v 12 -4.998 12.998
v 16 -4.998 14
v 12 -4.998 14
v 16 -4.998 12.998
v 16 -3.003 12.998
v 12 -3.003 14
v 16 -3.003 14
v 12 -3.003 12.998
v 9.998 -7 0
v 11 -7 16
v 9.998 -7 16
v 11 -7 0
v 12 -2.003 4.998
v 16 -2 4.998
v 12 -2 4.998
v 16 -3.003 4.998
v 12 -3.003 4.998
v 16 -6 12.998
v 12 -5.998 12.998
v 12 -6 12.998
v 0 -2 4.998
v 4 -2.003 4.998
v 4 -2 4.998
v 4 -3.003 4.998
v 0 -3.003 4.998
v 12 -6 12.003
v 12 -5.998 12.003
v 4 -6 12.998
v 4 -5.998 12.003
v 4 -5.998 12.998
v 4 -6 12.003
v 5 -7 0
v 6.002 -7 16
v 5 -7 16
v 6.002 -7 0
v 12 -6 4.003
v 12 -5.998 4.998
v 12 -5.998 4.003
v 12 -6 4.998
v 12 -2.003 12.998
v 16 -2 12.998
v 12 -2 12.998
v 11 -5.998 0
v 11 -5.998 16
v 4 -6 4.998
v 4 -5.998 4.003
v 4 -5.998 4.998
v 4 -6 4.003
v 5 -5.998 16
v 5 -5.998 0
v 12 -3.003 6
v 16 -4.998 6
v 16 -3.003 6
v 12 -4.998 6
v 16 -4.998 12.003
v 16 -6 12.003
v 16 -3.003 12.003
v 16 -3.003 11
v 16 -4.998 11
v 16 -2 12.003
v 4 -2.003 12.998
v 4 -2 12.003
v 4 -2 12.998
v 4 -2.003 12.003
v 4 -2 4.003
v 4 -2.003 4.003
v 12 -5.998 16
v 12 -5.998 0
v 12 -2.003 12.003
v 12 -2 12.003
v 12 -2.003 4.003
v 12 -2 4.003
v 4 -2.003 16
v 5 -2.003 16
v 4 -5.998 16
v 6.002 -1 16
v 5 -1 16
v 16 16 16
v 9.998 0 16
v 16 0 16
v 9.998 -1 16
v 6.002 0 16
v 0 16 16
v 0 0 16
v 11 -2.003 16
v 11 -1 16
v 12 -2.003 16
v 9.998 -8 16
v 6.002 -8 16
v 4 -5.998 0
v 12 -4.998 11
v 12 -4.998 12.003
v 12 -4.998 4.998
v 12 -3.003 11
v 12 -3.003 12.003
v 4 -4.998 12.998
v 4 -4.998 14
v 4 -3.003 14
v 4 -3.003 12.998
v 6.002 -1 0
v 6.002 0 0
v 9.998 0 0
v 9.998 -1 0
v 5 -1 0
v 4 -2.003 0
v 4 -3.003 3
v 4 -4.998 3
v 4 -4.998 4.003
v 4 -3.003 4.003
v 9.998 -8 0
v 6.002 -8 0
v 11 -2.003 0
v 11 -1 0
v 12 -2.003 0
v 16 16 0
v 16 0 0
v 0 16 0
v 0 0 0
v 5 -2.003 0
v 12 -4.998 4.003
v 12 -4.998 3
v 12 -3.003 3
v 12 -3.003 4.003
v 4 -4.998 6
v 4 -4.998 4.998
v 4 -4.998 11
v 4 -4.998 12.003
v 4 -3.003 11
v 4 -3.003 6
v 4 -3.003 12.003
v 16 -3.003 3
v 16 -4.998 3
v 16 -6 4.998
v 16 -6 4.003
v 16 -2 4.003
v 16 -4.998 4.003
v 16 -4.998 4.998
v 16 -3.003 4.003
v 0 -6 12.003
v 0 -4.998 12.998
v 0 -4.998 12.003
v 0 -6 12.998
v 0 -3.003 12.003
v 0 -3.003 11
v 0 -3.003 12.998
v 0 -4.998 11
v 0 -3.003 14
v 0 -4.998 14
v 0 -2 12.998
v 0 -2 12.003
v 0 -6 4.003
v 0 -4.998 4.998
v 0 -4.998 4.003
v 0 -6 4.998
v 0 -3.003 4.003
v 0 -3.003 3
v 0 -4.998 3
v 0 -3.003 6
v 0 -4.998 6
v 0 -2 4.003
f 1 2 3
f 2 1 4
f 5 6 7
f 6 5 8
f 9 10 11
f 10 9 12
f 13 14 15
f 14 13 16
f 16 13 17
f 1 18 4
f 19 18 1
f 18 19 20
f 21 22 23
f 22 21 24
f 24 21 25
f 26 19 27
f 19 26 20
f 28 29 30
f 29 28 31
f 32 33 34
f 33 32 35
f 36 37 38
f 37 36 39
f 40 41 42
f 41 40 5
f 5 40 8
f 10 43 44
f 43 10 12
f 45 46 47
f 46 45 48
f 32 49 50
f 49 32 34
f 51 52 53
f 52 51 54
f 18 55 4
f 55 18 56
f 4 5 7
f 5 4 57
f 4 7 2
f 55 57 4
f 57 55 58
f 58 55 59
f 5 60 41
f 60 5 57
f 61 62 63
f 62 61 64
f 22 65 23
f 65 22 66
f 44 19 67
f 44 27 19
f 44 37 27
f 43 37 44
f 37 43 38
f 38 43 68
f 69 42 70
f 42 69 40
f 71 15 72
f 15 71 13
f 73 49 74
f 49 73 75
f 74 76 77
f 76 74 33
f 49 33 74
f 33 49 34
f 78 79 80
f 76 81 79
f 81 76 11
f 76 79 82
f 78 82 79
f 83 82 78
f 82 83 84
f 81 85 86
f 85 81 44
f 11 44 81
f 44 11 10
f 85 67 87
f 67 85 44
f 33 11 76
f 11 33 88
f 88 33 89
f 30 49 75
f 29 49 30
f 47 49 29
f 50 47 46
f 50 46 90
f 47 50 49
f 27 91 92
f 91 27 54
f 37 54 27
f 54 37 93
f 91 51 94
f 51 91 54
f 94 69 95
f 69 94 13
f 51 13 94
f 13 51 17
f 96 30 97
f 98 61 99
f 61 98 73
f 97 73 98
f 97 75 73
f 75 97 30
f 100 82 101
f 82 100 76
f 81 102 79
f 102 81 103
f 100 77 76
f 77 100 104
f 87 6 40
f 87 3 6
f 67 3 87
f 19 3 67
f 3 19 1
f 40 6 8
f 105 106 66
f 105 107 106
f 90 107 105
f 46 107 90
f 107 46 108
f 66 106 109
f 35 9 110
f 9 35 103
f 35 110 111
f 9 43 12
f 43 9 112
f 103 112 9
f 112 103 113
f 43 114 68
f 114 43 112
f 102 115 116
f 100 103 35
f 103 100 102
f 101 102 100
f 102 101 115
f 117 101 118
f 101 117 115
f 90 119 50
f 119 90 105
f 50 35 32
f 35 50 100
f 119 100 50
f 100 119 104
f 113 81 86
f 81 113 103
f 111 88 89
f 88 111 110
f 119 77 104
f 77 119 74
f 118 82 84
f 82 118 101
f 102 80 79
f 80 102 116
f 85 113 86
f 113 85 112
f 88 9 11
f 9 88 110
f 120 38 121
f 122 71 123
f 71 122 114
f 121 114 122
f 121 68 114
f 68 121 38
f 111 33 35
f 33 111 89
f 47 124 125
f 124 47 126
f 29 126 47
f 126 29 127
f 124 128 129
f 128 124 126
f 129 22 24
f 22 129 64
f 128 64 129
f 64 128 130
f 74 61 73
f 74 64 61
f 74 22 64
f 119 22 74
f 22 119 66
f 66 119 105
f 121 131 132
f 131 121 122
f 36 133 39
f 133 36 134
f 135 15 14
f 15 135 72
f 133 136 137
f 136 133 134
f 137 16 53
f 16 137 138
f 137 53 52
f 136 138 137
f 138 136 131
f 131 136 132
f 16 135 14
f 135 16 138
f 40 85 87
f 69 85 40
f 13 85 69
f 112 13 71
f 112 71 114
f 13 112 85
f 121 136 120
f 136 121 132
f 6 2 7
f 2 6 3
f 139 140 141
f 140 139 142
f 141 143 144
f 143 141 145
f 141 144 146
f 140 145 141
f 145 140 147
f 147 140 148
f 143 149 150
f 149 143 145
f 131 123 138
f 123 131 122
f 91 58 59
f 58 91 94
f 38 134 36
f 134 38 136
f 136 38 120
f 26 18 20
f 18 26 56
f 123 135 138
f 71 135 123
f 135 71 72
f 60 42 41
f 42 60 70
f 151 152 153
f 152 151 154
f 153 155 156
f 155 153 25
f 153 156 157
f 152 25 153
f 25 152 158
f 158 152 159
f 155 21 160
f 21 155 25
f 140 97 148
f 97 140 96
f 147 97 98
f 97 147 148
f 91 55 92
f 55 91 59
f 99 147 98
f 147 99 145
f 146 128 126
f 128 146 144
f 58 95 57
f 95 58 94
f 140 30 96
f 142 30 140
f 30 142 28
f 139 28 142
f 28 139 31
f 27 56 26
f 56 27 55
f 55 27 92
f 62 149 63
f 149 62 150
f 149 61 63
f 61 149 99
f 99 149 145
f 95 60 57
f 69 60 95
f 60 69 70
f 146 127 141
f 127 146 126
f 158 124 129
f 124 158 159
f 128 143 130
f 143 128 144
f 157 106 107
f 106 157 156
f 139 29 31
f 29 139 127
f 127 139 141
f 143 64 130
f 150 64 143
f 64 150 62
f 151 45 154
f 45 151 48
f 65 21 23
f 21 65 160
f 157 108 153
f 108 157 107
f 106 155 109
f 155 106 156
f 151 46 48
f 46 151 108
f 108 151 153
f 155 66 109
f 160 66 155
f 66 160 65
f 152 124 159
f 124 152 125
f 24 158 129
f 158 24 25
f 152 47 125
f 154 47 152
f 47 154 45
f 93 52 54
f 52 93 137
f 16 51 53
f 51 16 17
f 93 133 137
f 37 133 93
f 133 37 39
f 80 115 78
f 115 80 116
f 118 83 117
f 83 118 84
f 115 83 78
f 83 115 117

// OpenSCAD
module fence() {
  points=[[22,55.99700164794922,11],[22,55.99700164794922,12.003000259399414],[22,54.00199890136719,12.003000259399414],[22,55.99700164794922,11],[22,54.00199890136719,12.003000259399414],[22,54.00199890136719,11],[18,54.00199890136719,14],[18,54.00199890136719,12.998000144958496],[22,54.00199890136719,12.998000144958496],[18,54.00199890136719,14],[22,54.00199890136719,12.998000144958496],[22,54.00199890136719,14],[22,55.99700164794922,14],[22,55.99700164794922,12.998000144958496],[18,55.99700164794922,12.998000144958496],[22,55.99700164794922,14],[18,55.99700164794922,12.998000144958496],[18,55.99700164794922,14],[17,52,-2.6867397195928788e-14],[17,52,16],[15.998000144958496,52,16],[17,52,-2.6867397195928788e-14],[15.998000144958496,52,16],[15.998000144958496,52,-2.6867397195928788e-14],[22,57,4.998000144958496],[18,56.99700164794922,4.998000144958496],[22,55.99700164794922,4.998000144958496],[18,57,4.998000144958496],[18,56.99700164794922,4.998000144958496],[22,57,4.998000144958496],[18,55.99700164794922,4.998000144958496],[22,55.99700164794922,4.998000144958496],[18,56.99700164794922,4.998000144958496],[18,54.00199890136719,12.998000144958496],[18,53.00199890136719,12.998000144958496],[22,54.00199890136719,12.998000144958496],[22,53,12.998000144958496],[22,54.00199890136719,12.998000144958496],[18,53.00199890136719,12.998000144958496],[22,53,12.998000144958496],[18,53.00199890136719,12.998000144958496],[18,53,12.998000144958496],[6,55.99700164794922,4.998000144958496],[10,55.99700164794922,4.998000144958496],[10,56.99700164794922,4.998000144958496],[10,57,4.998000144958496],[6,57,4.998000144958496],[10,56.99700164794922,4.998000144958496],[6,55.99700164794922,4.998000144958496],[10,56.99700164794922,4.998000144958496],[6,57,4.998000144958496],[18,53.00199890136719,12.003000259399414],[18,53,12.003000259399414],[18,53,12.998000144958496],[18,53.00199890136719,12.003000259399414],[18,53,12.998000144958496],[18,53.00199890136719,12.998000144958496],[18,55.99700164794922,6],[18,55.99700164794922,4.998000144958496],[18,56.99700164794922,4.998000144958496],[10,53,12.998000144958496],[10,53,12.003000259399414],[10,53.00199890136719,12.003000259399414],[10,53,12.998000144958496],[10,53.00199890136719,12.003000259399414],[10,53.00199890136719,12.998000144958496],[12.001999855041504,52,-2.6867397195928788e-14],[12.001999855041504,52,16],[11,52,16],[12.001999855041504,52,-2.6867397195928788e-14],[11,52,16],[11,52,-2.6867397195928788e-14],[18,53.00199890136719,4.002999782562256],[18,53,4.002999782562256],[18,53,4.998000144958496],[18,53.00199890136719,4.002999782562256],[18,53,4.998000144958496],[18,53.00199890136719,4.998000144958496],[22,57,12.998000144958496],[18,56.99700164794922,12.998000144958496],[22,55.99700164794922,12.998000144958496],[18,57,12.998000144958496],[18,56.99700164794922,12.998000144958496],[22,57,12.998000144958496],[18,55.99700164794922,12.998000144958496],[22,55.99700164794922,12.998000144958496],[18,56.99700164794922,12.998000144958496],[17,52,16],[17,52,-2.6867397195928788e-14],[17,53.00199890136719,-2.6867397195928788e-14],[17,52,16],[17,53.00199890136719,-2.6867397195928788e-14],[17,53.00199890136719,16],[10,53,4.998000144958496],[10,53,4.002999782562256],[10,53.00199890136719,4.002999782562256],[10,53,4.998000144958496],[10,53.00199890136719,4.002999782562256],[10,53.00199890136719,4.998000144958496],[22,54.00199890136719,14],[22,54.00199890136719,12.998000144958496],[22,55.99700164794922,12.998000144958496],[22,54.00199890136719,14],[22,55.99700164794922,12.998000144958496],[22,55.99700164794922,14],[11,52,16],[11,53.00199890136719,16],[11,53.00199890136719,-2.6867397195928788e-14],[11,52,16],[11,53.00199890136719,-2.6867397195928788e-14],[11,52,-2.6867397195928788e-14],[22,55.99700164794922,6],[18,55.99700164794922,6],[18,54.00199890136719,6],[22,55.99700164794922,6],[18,54.00199890136719,6],[22,54.00199890136719,6],[22,53,12.003000259399414],[22,54.00199890136719,12.003000259399414],[22,54.00199890136719,12.998000144958496],[22,53,12.998000144958496],[22,53,12.003000259399414],[22,54.00199890136719,12.998000144958496],[22,55.99700164794922,12.998000144958496],[22,54.00199890136719,12.998000144958496],[22,54.00199890136719,12.003000259399414],[22,54.00199890136719,12.003000259399414],[22,55.99700164794922,12.003000259399414],[22,55.99700164794922,12.998000144958496],[22,57,12.998000144958496],[22,55.99700164794922,12.998000144958496],[22,55.99700164794922,12.003000259399414],[22,57,12.998000144958496],[22,55.99700164794922,12.003000259399414],[22,57,12.003000259399414],[10,56.99700164794922,12.003000259399414],[10,57,12.003000259399414],[10,57,12.998000144958496],[10,56.99700164794922,12.003000259399414],[10,57,12.998000144958496],[10,56.99700164794922,12.998000144958496],[22,55.99700164794922,3],[22,55.99700164794922,4.002999782562256],[22,54.00199890136719,4.002999782562256],[22,55.99700164794922,3],[22,54.00199890136719,4.002999782562256],[22,54.00199890136719,3],[22,54.00199890136719,6],[22,54.00199890136719,4.998000144958496],[22,55.99700164794922,4.998000144958496],[22,54.00199890136719,6],[22,55.99700164794922,4.998000144958496],[22,55.99700164794922,6],[10,56.99700164794922,4.998000144958496],[10,55.99700164794922,4.998000144958496],[10,55.99700164794922,6],[10,56.99700164794922,4.002999782562256],[10,57,4.002999782562256],[10,57,4.998000144958496],[10,56.99700164794922,4.002999782562256],[10,57,4.998000144958496],[10,56.99700164794922,4.998000144958496],[17,53.00199890136719,16],[17,53.00199890136719,-2.6867397195928788e-14],[18,53.00199890136719,4.998000144958496],[18,53.00199890136719,12.003000259399414],[17,53.00199890136719,16],[18,53.00199890136719,4.998000144958496],[18,53.00199890136719,12.998000144958496],[17,53.00199890136719,16],[18,53.00199890136719,12.003000259399414],[18,53.00199890136719,16],[17,53.00199890136719,16],[18,53.00199890136719,12.998000144958496],[18,53.00199890136719,4.002999782562256],[18,53.00199890136719,4.998000144958496],[17,53.00199890136719,-2.6867397195928788e-14],[18,53.00199890136719,-2.6867397195928788e-14],[18,53.00199890136719,4.002999782562256],[17,53.00199890136719,-2.6867397195928788e-14],[18,57,12.998000144958496],[18,57,12.003000259399414],[18,56.99700164794922,12.003000259399414],[18,57,12.998000144958496],[18,56.99700164794922,12.003000259399414],[18,56.99700164794922,12.998000144958496],[15.998000144958496,51,16],[15.998000144958496,52,16],[12.001999855041504,52,16],[15.998000144958496,51,16],[12.001999855041504,52,16],[12.001999855041504,51,16],[10,56.99700164794922,16],[10,55.99700164794922,14],[10,54.00199890136719,14],[10,56.99700164794922,16],[10,54.00199890136719,14],[10,53.00199890136719,16],[18,57,4.998000144958496],[18,57,4.002999782562256],[18,56.99700164794922,4.002999782562256],[18,57,4.998000144958496],[18,56.99700164794922,4.002999782562256],[18,56.99700164794922,4.998000144958496],[18,56.99700164794922,16],[17,56.99700164794922,16],[17,53.00199890136719,16],[11,52,16],[12.001999855041504,52,16],[11,53.00199890136719,16],[17,53.00199890136719,16],[17,56.99700164794922,16],[15.998000144958496,52,16],[17,52,16],[17,53.00199890136719,16],[15.998000144958496,52,16],[18,53.00199890136719,16],[18,54.00199890136719,14],[18,55.99700164794922,14],[18,53.00199890136719,16],[18,55.99700164794922,14],[18,56.99700164794922,16],[15.998000144958496,58,16],[15.998000144958496,59,16],[12.001999855041504,59,16],[15.998000144958496,58,16],[12.001999855041504,59,16],[12.001999855041504,58,16],[6,54.00199890136719,11],[6,54.00199890136719,12.003000259399414],[6,55.99700164794922,12.003000259399414],[6,54.00199890136719,11],[6,55.99700164794922,12.003000259399414],[6,55.99700164794922,11],[10,54.00199890136719,6],[10,54.00199890136719,11],[10,55.99700164794922,6],[10,54.00199890136719,6],[10,53.00199890136719,4.998000144958496],[10,54.00199890136719,11],[10,54.00199890136719,11],[10,55.99700164794922,11],[10,55.99700164794922,6],[10,56.99700164794922,4.998000144958496],[10,55.99700164794922,6],[10,55.99700164794922,11],[6,55.99700164794922,14],[6,55.99700164794922,12.998000144958496],[6,54.00199890136719,12.998000144958496],[6,55.99700164794922,14],[6,54.00199890136719,12.998000144958496],[6,54.00199890136719,14],[17,56.99700164794922,16],[17,58,16],[15.998000144958496,58,16],[17,56.99700164794922,16],[15.998000144958496,58,16],[12.001999855041504,58,16],[11,58,16],[11,56.99700164794922,16],[12.001999855041504,58,16],[17,56.99700164794922,16],[12.001999855041504,58,16],[11,56.99700164794922,16],[10,53.00199890136719,12.003000259399414],[10,54.00199890136719,12.003000259399414],[10,54.00199890136719,11],[18,55.99700164794922,6],[18,55.99700164794922,11],[18,54.00199890136719,6],[18,56.99700164794922,4.998000144958496],[18,55.99700164794922,11],[18,55.99700164794922,6],[18,55.99700164794922,11],[18,54.00199890136719,11],[18,54.00199890136719,6],[18,53.00199890136719,4.998000144958496],[18,54.00199890136719,6],[18,54.00199890136719,11],[10,53.00199890136719,16],[11,53.00199890136719,16],[11,56.99700164794922,16],[10,56.99700164794922,16],[10,53.00199890136719,16],[11,56.99700164794922,16],[17,56.99700164794922,16],[11,56.99700164794922,16],[11,53.00199890136719,16],[11,53.00199890136719,16],[12.001999855041504,52,16],[17,56.99700164794922,16],[12.001999855041504,52,16],[15.998000144958496,52,16],[17,56.99700164794922,16],[18,56.99700164794922,16],[17,53.00199890136719,16],[18,53.00199890136719,16],[10,53.00199890136719,16],[10,53.00199890136719,12.998000144958496],[11,53.00199890136719,16],[10,53.00199890136719,12.998000144958496],[10,53.00199890136719,12.003000259399414],[11,53.00199890136719,16],[10,53.00199890136719,12.003000259399414],[10,53.00199890136719,4.998000144958496],[11,53.00199890136719,16],[11,53.00199890136719,-2.6867397195928788e-14],[11,53.00199890136719,16],[10,53.00199890136719,4.998000144958496],[11,53.00199890136719,-2.6867397195928788e-14],[10,53.00199890136719,4.998000144958496],[10,53.00199890136719,4.002999782562256],[11,53.00199890136719,-2.6867397195928788e-14],[10,53.00199890136719,4.002999782562256],[10,53.00199890136719,-2.6867397195928788e-14],[10,55.99700164794922,11],[10,55.99700164794922,12.003000259399414],[10,56.99700164794922,12.003000259399414],[10,55.99700164794922,11],[10,56.99700164794922,12.003000259399414],[10,56.99700164794922,4.998000144958496],[15.998000144958496,52,-2.6867397195928788e-14],[15.998000144958496,51,-2.6867397195928788e-14],[12.001999855041504,51,-2.6867397195928788e-14],[15.998000144958496,52,-2.6867397195928788e-14],[12.001999855041504,51,-2.6867397195928788e-14],[12.001999855041504,52,-2.6867397195928788e-14],[18,54.00199890136719,11],[18,54.00199890136719,12.003000259399414],[18,53.00199890136719,12.003000259399414],[18,54.00199890136719,11],[18,53.00199890136719,12.003000259399414],[18,53.00199890136719,4.998000144958496],[17,53.00199890136719,-2.6867397195928788e-14],[17,52,-2.6867397195928788e-14],[15.998000144958496,52,-2.6867397195928788e-14],[17,53.00199890136719,-2.6867397195928788e-14],[15.998000144958496,52,-2.6867397195928788e-14],[12.001999855041504,52,-2.6867397195928788e-14],[11,52,-2.6867397195928788e-14],[11,53.00199890136719,-2.6867397195928788e-14],[12.001999855041504,52,-2.6867397195928788e-14],[17,53.00199890136719,-2.6867397195928788e-14],[12.001999855041504,52,-2.6867397195928788e-14],[11,53.00199890136719,-2.6867397195928788e-14],[15.998000144958496,59,-2.6867397195928788e-14],[15.998000144958496,58,-2.6867397195928788e-14],[12.001999855041504,58,-2.6867397195928788e-14],[15.998000144958496,59,-2.6867397195928788e-14],[12.001999855041504,58,-2.6867397195928788e-14],[12.001999855041504,59,-2.6867397195928788e-14],[18,55.99700164794922,12.003000259399414],[18,55.99700164794922,11],[18,56.99700164794922,12.003000259399414],[18,56.99700164794922,4.998000144958496],[18,56.99700164794922,12.003000259399414],[18,55.99700164794922,11],[10,54.00199890136719,14],[10,54.00199890136719,12.998000144958496],[10,53.00199890136719,12.998000144958496],[10,54.00199890136719,14],[10,53.00199890136719,12.998000144958496],[10,53.00199890136719,16],[12.001999855041504,59,-2.6867397195928788e-14],[12.001999855041504,58,-2.6867397195928788e-14],[12.001999855041504,58,16],[12.001999855041504,59,-2.6867397195928788e-14],[12.001999855041504,58,16],[12.001999855041504,59,16],[15.998000144958496,59,16],[15.998000144958496,58,16],[15.998000144958496,58,-2.6867397195928788e-14],[15.998000144958496,59,16],[15.998000144958496,58,-2.6867397195928788e-14],[15.998000144958496,59,-2.6867397195928788e-14],[10,55.99700164794922,12.998000144958496],[10,55.99700164794922,14],[10,56.99700164794922,12.998000144958496],[10,56.99700164794922,16],[10,56.99700164794922,12.998000144958496],[10,55.99700164794922,14],[18,53.00199890136719,-2.6867397195928788e-14],[17,53.00199890136719,-2.6867397195928788e-14],[17,56.99700164794922,-2.6867397195928788e-14],[11,58,-2.6867397195928788e-14],[12.001999855041504,58,-2.6867397195928788e-14],[11,56.99700164794922,-2.6867397195928788e-14],[12.001999855041504,58,-2.6867397195928788e-14],[15.998000144958496,58,-2.6867397195928788e-14],[17,56.99700164794922,-2.6867397195928788e-14],[17,58,-2.6867397195928788e-14],[17,56.99700164794922,-2.6867397195928788e-14],[15.998000144958496,58,-2.6867397195928788e-14],[12.001999855041504,58,16],[12.001999855041504,58,-2.6867397195928788e-14],[11,58,-2.6867397195928788e-14],[12.001999855041504,58,16],[11,58,-2.6867397195928788e-14],[11,58,16],[18,54.00199890136719,12.998000144958496],[18,54.00199890136719,14],[18,53.00199890136719,12.998000144958496],[18,53.00199890136719,16],[18,53.00199890136719,12.998000144958496],[18,54.00199890136719,14],[10,53.00199890136719,4.002999782562256],[10,54.00199890136719,3],[10,53.00199890136719,-2.6867397195928788e-14],[10,56.99700164794922,-2.6867397195928788e-14],[10,53.00199890136719,-2.6867397195928788e-14],[10,54.00199890136719,3],[10,56.99700164794922,-2.6867397195928788e-14],[10,54.00199890136719,3],[10,55.99700164794922,3],[10,56.99700164794922,-2.6867397195928788e-14],[11,56.99700164794922,-2.6867397195928788e-14],[11,53.00199890136719,-2.6867397195928788e-14],[10,53.00199890136719,-2.6867397195928788e-14],[10,56.99700164794922,-2.6867397195928788e-14],[11,53.00199890136719,-2.6867397195928788e-14],[17,53.00199890136719,-2.6867397195928788e-14],[11,53.00199890136719,-2.6867397195928788e-14],[11,56.99700164794922,-2.6867397195928788e-14],[11,56.99700164794922,-2.6867397195928788e-14],[12.001999855041504,58,-2.6867397195928788e-14],[17,53.00199890136719,-2.6867397195928788e-14],[12.001999855041504,58,-2.6867397195928788e-14],[17,56.99700164794922,-2.6867397195928788e-14],[17,53.00199890136719,-2.6867397195928788e-14],[18,53.00199890136719,-2.6867397195928788e-14],[17,56.99700164794922,-2.6867397195928788e-14],[18,56.99700164794922,-2.6867397195928788e-14],[17,58,16],[17,58,-2.6867397195928788e-14],[15.998000144958496,58,-2.6867397195928788e-14],[17,58,16],[15.998000144958496,58,-2.6867397195928788e-14],[15.998000144958496,58,16],[18,55.99700164794922,14],[18,55.99700164794922,12.998000144958496],[18,56.99700164794922,12.998000144958496],[18,55.99700164794922,14],[18,56.99700164794922,12.998000144958496],[18,56.99700164794922,16],[12.001999855041504,51,16],[12.001999855041504,51,-2.6867397195928788e-14],[15.998000144958496,51,-2.6867397195928788e-14],[12.001999855041504,51,16],[15.998000144958496,51,-2.6867397195928788e-14],[15.998000144958496,51,16],[10,53.00199890136719,4.002999782562256],[10,54.00199890136719,4.002999782562256],[10,54.00199890136719,3],[11,58,16],[11,58,-2.6867397195928788e-14],[11,56.99700164794922,-2.6867397195928788e-14],[11,58,16],[11,56.99700164794922,-2.6867397195928788e-14],[11,56.99700164794922,16],[15.998000144958496,59,16],[15.998000144958496,59,-2.6867397195928788e-14],[12.001999855041504,59,-2.6867397195928788e-14],[15.998000144958496,59,16],[12.001999855041504,59,-2.6867397195928788e-14],[12.001999855041504,59,16],[18,53.00199890136719,-2.6867397195928788e-14],[18,56.99700164794922,-2.6867397195928788e-14],[18,55.99700164794922,3],[18,53.00199890136719,-2.6867397195928788e-14],[18,55.99700164794922,3],[18,54.00199890136719,3],[17,58,16],[17,56.99700164794922,16],[17,56.99700164794922,-2.6867397195928788e-14],[17,58,16],[17,56.99700164794922,-2.6867397195928788e-14],[17,58,-2.6867397195928788e-14],[10,55.99700164794922,3],[10,55.99700164794922,4.002999782562256],[10,56.99700164794922,4.002999782562256],[10,55.99700164794922,3],[10,56.99700164794922,4.002999782562256],[10,56.99700164794922,-2.6867397195928788e-14],[15.998000144958496,51,-2.6867397195928788e-14],[15.998000144958496,52,-2.6867397195928788e-14],[15.998000144958496,52,16],[15.998000144958496,51,-2.6867397195928788e-14],[15.998000144958496,52,16],[15.998000144958496,51,16],[18,54.00199890136719,3],[18,54.00199890136719,4.002999782562256],[18,53.00199890136719,4.002999782562256],[18,54.00199890136719,3],[18,53.00199890136719,4.002999782562256],[18,53.00199890136719,-2.6867397195928788e-14],[12.001999855041504,51,16],[12.001999855041504,52,16],[12.001999855041504,52,-2.6867397195928788e-14],[12.001999855041504,51,16],[12.001999855041504,52,-2.6867397195928788e-14],[12.001999855041504,51,-2.6867397195928788e-14],[10,54.00199890136719,6],[10,54.00199890136719,4.998000144958496],[10,53.00199890136719,4.998000144958496],[10,53.00199890136719,12.003000259399414],[10,54.00199890136719,11],[10,53.00199890136719,4.998000144958496],[18,55.99700164794922,4.002999782562256],[18,55.99700164794922,3],[18,56.99700164794922,4.002999782562256],[18,56.99700164794922,-2.6867397195928788e-14],[18,56.99700164794922,4.002999782562256],[18,55.99700164794922,3],[10,56.99700164794922,-2.6867397195928788e-14],[10,56.99700164794922,4.002999782562256],[11,56.99700164794922,-2.6867397195928788e-14],[10,56.99700164794922,4.002999782562256],[10,56.99700164794922,4.998000144958496],[11,56.99700164794922,-2.6867397195928788e-14],[11,56.99700164794922,16],[11,56.99700164794922,-2.6867397195928788e-14],[10,56.99700164794922,4.998000144958496],[11,56.99700164794922,16],[10,56.99700164794922,4.998000144958496],[10,56.99700164794922,12.003000259399414],[11,56.99700164794922,16],[10,56.99700164794922,12.003000259399414],[10,56.99700164794922,12.998000144958496],[11,56.99700164794922,16],[10,56.99700164794922,12.998000144958496],[10,56.99700164794922,16],[22,54.00199890136719,3],[18,54.00199890136719,3],[18,55.99700164794922,3],[22,54.00199890136719,3],[18,55.99700164794922,3],[22,55.99700164794922,3],[18,53.00199890136719,4.998000144958496],[18,54.00199890136719,4.998000144958496],[18,54.00199890136719,6],[22,53,4.998000144958496],[18,53,4.998000144958496],[18,53,4.002999782562256],[22,53,4.998000144958496],[18,53,4.002999782562256],[22,53,4.002999782562256],[18,57,4.998000144958496],[22,57,4.998000144958496],[22,57,4.002999782562256],[18,57,4.998000144958496],[22,57,4.002999782562256],[18,57,4.002999782562256],[22,53,4.002999782562256],[22,54.00199890136719,4.002999782562256],[22,54.00199890136719,4.998000144958496],[22,53,4.998000144958496],[22,53,4.002999782562256],[22,54.00199890136719,4.998000144958496],[22,55.99700164794922,4.998000144958496],[22,54.00199890136719,4.998000144958496],[22,54.00199890136719,4.002999782562256],[22,54.00199890136719,4.002999782562256],[22,55.99700164794922,4.002999782562256],[22,55.99700164794922,4.998000144958496],[22,57,4.998000144958496],[22,55.99700164794922,4.998000144958496],[22,55.99700164794922,4.002999782562256],[22,57,4.998000144958496],[22,55.99700164794922,4.002999782562256],[22,57,4.002999782562256],[18,56.99700164794922,12.003000259399414],[18,56.99700164794922,4.998000144958496],[17,56.99700164794922,16],[17,56.99700164794922,-2.6867397195928788e-14],[17,56.99700164794922,16],[18,56.99700164794922,4.998000144958496],[18,56.99700164794922,4.002999782562256],[17,56.99700164794922,-2.6867397195928788e-14],[18,56.99700164794922,4.998000144958496],[18,56.99700164794922,-2.6867397195928788e-14],[17,56.99700164794922,-2.6867397195928788e-14],[18,56.99700164794922,4.002999782562256],[18,56.99700164794922,12.998000144958496],[18,56.99700164794922,12.003000259399414],[17,56.99700164794922,16],[18,56.99700164794922,16],[18,56.99700164794922,12.998000144958496],[17,56.99700164794922,16],[22,54.00199890136719,4.002999782562256],[18,54.00199890136719,4.002999782562256],[18,54.00199890136719,3],[22,54.00199890136719,4.002999782562256],[18,54.00199890136719,3],[22,54.00199890136719,3],[22,55.99700164794922,14],[18,55.99700164794922,14],[18,54.00199890136719,14],[22,55.99700164794922,14],[18,54.00199890136719,14],[22,54.00199890136719,14],[6,57,12.003000259399414],[6,55.99700164794922,12.003000259399414],[6,55.99700164794922,12.998000144958496],[6,57,12.998000144958496],[6,57,12.003000259399414],[6,55.99700164794922,12.998000144958496],[6,54.00199890136719,12.998000144958496],[6,55.99700164794922,12.998000144958496],[6,55.99700164794922,12.003000259399414],[6,55.99700164794922,12.003000259399414],[6,54.00199890136719,12.003000259399414],[6,54.00199890136719,12.998000144958496],[6,53,12.998000144958496],[6,54.00199890136719,12.998000144958496],[6,54.00199890136719,12.003000259399414],[6,53,12.998000144958496],[6,54.00199890136719,12.003000259399414],[6,53,12.003000259399414],[18,55.99700164794922,4.002999782562256],[22,55.99700164794922,4.002999782562256],[22,55.99700164794922,3],[18,55.99700164794922,4.002999782562256],[22,55.99700164794922,3],[18,55.99700164794922,3],[22,54.00199890136719,11],[18,54.00199890136719,11],[18,55.99700164794922,11],[22,54.00199890136719,11],[18,55.99700164794922,11],[22,55.99700164794922,11],[6,54.00199890136719,3],[6,54.00199890136719,4.002999782562256],[6,55.99700164794922,4.002999782562256],[6,54.00199890136719,3],[6,55.99700164794922,4.002999782562256],[6,55.99700164794922,3],[22,53,4.002999782562256],[18,53.00199890136719,4.002999782562256],[22,54.00199890136719,4.002999782562256],[18,53,4.002999782562256],[18,53.00199890136719,4.002999782562256],[22,53,4.002999782562256],[18,54.00199890136719,4.002999782562256],[22,54.00199890136719,4.002999782562256],[18,53.00199890136719,4.002999782562256],[22,53,12.998000144958496],[18,53,12.998000144958496],[18,53,12.003000259399414],[22,53,12.998000144958496],[18,53,12.003000259399414],[22,53,12.003000259399414],[6,55.99700164794922,6],[6,55.99700164794922,4.998000144958496],[6,54.00199890136719,4.998000144958496],[6,55.99700164794922,6],[6,54.00199890136719,4.998000144958496],[6,54.00199890136719,6],[18,55.99700164794922,4.002999782562256],[18,56.99700164794922,4.002999782562256],[22,55.99700164794922,4.002999782562256],[22,57,4.002999782562256],[22,55.99700164794922,4.002999782562256],[18,56.99700164794922,4.002999782562256],[22,57,4.002999782562256],[18,56.99700164794922,4.002999782562256],[18,57,4.002999782562256],[18,57,12.998000144958496],[22,57,12.998000144958496],[22,57,12.003000259399414],[18,57,12.998000144958496],[22,57,12.003000259399414],[18,57,12.003000259399414],[6,57,4.002999782562256],[6,55.99700164794922,4.002999782562256],[6,55.99700164794922,4.998000144958496],[6,57,4.998000144958496],[6,57,4.002999782562256],[6,55.99700164794922,4.998000144958496],[6,54.00199890136719,4.998000144958496],[6,55.99700164794922,4.998000144958496],[6,55.99700164794922,4.002999782562256],[6,55.99700164794922,4.002999782562256],[6,54.00199890136719,4.002999782562256],[6,54.00199890136719,4.998000144958496],[6,53,4.998000144958496],[6,54.00199890136719,4.998000144958496],[6,54.00199890136719,4.002999782562256],[6,53,4.998000144958496],[6,54.00199890136719,4.002999782562256],[6,53,4.002999782562256],[6,54.00199890136719,14],[6,54.00199890136719,12.998000144958496],[10,54.00199890136719,12.998000144958496],[6,54.00199890136719,14],[10,54.00199890136719,12.998000144958496],[10,54.00199890136719,14],[10,55.99700164794922,14],[6,55.99700164794922,14],[6,54.00199890136719,14],[10,55.99700164794922,14],[6,54.00199890136719,14],[10,54.00199890136719,14],[22,54.00199890136719,12.003000259399414],[18,54.00199890136719,12.003000259399414],[18,54.00199890136719,11],[22,54.00199890136719,12.003000259399414],[18,54.00199890136719,11],[22,54.00199890136719,11],[10,55.99700164794922,14],[10,55.99700164794922,12.998000144958496],[6,55.99700164794922,12.998000144958496],[10,55.99700164794922,14],[6,55.99700164794922,12.998000144958496],[6,55.99700164794922,14],[10,54.00199890136719,11],[6,54.00199890136719,11],[6,55.99700164794922,11],[10,54.00199890136719,11],[6,55.99700164794922,11],[10,55.99700164794922,11],[18,55.99700164794922,12.003000259399414],[22,55.99700164794922,12.003000259399414],[22,55.99700164794922,11],[18,55.99700164794922,12.003000259399414],[22,55.99700164794922,11],[18,55.99700164794922,11],[10,54.00199890136719,12.998000144958496],[6,54.00199890136719,12.998000144958496],[10,53.00199890136719,12.998000144958496],[6,54.00199890136719,12.998000144958496],[6,53,12.998000144958496],[10,53.00199890136719,12.998000144958496],[10,53,12.998000144958496],[10,53.00199890136719,12.998000144958496],[6,53,12.998000144958496],[10,53,12.998000144958496],[6,53,12.998000144958496],[6,53,12.003000259399414],[10,53,12.998000144958496],[6,53,12.003000259399414],[10,53,12.003000259399414],[22,53,12.003000259399414],[18,53.00199890136719,12.003000259399414],[22,54.00199890136719,12.003000259399414],[18,53,12.003000259399414],[18,53.00199890136719,12.003000259399414],[22,53,12.003000259399414],[18,54.00199890136719,12.003000259399414],[22,54.00199890136719,12.003000259399414],[18,53.00199890136719,12.003000259399414],[6,57,12.998000144958496],[10,57,12.998000144958496],[10,57,12.003000259399414],[6,57,12.998000144958496],[10,57,12.003000259399414],[6,57,12.003000259399414],[6,55.99700164794922,12.998000144958496],[10,55.99700164794922,12.998000144958496],[10,56.99700164794922,12.998000144958496],[10,57,12.998000144958496],[6,57,12.998000144958496],[10,56.99700164794922,12.998000144958496],[6,55.99700164794922,12.998000144958496],[10,56.99700164794922,12.998000144958496],[6,57,12.998000144958496],[18,55.99700164794922,12.003000259399414],[18,56.99700164794922,12.003000259399414],[22,55.99700164794922,12.003000259399414],[22,57,12.003000259399414],[22,55.99700164794922,12.003000259399414],[18,56.99700164794922,12.003000259399414],[22,57,12.003000259399414],[18,56.99700164794922,12.003000259399414],[18,57,12.003000259399414],[10,54.00199890136719,12.003000259399414],[6,54.00199890136719,12.003000259399414],[6,54.00199890136719,11],[10,54.00199890136719,12.003000259399414],[6,54.00199890136719,11],[10,54.00199890136719,11],[10,55.99700164794922,6],[6,55.99700164794922,6],[6,54.00199890136719,6],[10,55.99700164794922,6],[6,54.00199890136719,6],[10,54.00199890136719,6],[6,55.99700164794922,12.003000259399414],[10,55.99700164794922,12.003000259399414],[10,55.99700164794922,11],[6,55.99700164794922,12.003000259399414],[10,55.99700164794922,11],[6,55.99700164794922,11],[10,54.00199890136719,3],[6,54.00199890136719,3],[6,55.99700164794922,3],[10,54.00199890136719,3],[6,55.99700164794922,3],[10,55.99700164794922,3],[6,54.00199890136719,12.003000259399414],[10,54.00199890136719,12.003000259399414],[10,53.00199890136719,12.003000259399414],[10,53,12.003000259399414],[6,53,12.003000259399414],[10,53.00199890136719,12.003000259399414],[6,54.00199890136719,12.003000259399414],[10,53.00199890136719,12.003000259399414],[6,53,12.003000259399414],[10,55.99700164794922,12.003000259399414],[6,55.99700164794922,12.003000259399414],[10,56.99700164794922,12.003000259399414],[6,55.99700164794922,12.003000259399414],[6,57,12.003000259399414],[10,56.99700164794922,12.003000259399414],[10,57,12.003000259399414],[10,56.99700164794922,12.003000259399414],[6,57,12.003000259399414],[10,53,4.998000144958496],[6,53,4.998000144958496],[6,53,4.002999782562256],[10,53,4.998000144958496],[6,53,4.002999782562256],[10,53,4.002999782562256],[6,57,4.998000144958496],[10,57,4.998000144958496],[10,57,4.002999782562256],[6,57,4.998000144958496],[10,57,4.002999782562256],[6,57,4.002999782562256],[10,54.00199890136719,4.002999782562256],[6,54.00199890136719,4.002999782562256],[6,54.00199890136719,3],[10,54.00199890136719,4.002999782562256],[6,54.00199890136719,3],[10,54.00199890136719,3],[6,55.99700164794922,4.002999782562256],[10,55.99700164794922,4.002999782562256],[10,55.99700164794922,3],[6,55.99700164794922,4.002999782562256],[10,55.99700164794922,3],[6,55.99700164794922,3],[6,54.00199890136719,4.002999782562256],[10,54.00199890136719,4.002999782562256],[10,53.00199890136719,4.002999782562256],[10,53,4.002999782562256],[6,53,4.002999782562256],[10,53.00199890136719,4.002999782562256],[6,54.00199890136719,4.002999782562256],[10,53.00199890136719,4.002999782562256],[6,53,4.002999782562256],[10,55.99700164794922,4.002999782562256],[6,55.99700164794922,4.002999782562256],[10,56.99700164794922,4.002999782562256],[6,55.99700164794922,4.002999782562256],[6,57,4.002999782562256],[10,56.99700164794922,4.002999782562256],[10,57,4.002999782562256],[10,56.99700164794922,4.002999782562256],[6,57,4.002999782562256],[6,54.00199890136719,6],[6,54.00199890136719,4.998000144958496],[10,54.00199890136719,4.998000144958496],[6,54.00199890136719,6],[10,54.00199890136719,4.998000144958496],[10,54.00199890136719,6],[10,55.99700164794922,6],[10,55.99700164794922,4.998000144958496],[6,55.99700164794922,4.998000144958496],[10,55.99700164794922,6],[6,55.99700164794922,4.998000144958496],[6,55.99700164794922,6],[10,54.00199890136719,4.998000144958496],[6,54.00199890136719,4.998000144958496],[10,53.00199890136719,4.998000144958496],[6,54.00199890136719,4.998000144958496],[6,53,4.998000144958496],[10,53.00199890136719,4.998000144958496],[10,53,4.998000144958496],[10,53.00199890136719,4.998000144958496],[6,53,4.998000144958496],[18,54.00199890136719,6],[18,54.00199890136719,4.998000144958496],[22,54.00199890136719,4.998000144958496],[18,54.00199890136719,6],[22,54.00199890136719,4.998000144958496],[22,54.00199890136719,6],[22,55.99700164794922,6],[22,55.99700164794922,4.998000144958496],[18,55.99700164794922,4.998000144958496],[22,55.99700164794922,6],[18,55.99700164794922,4.998000144958496],[18,55.99700164794922,6],[18,54.00199890136719,4.998000144958496],[18,53.00199890136719,4.998000144958496],[22,54.00199890136719,4.998000144958496],[22,53,4.998000144958496],[22,54.00199890136719,4.998000144958496],[18,53.00199890136719,4.998000144958496],[22,53,4.998000144958496],[18,53.00199890136719,4.998000144958496],[18,53,4.998000144958496] ];
  faces=[[0,1,2],[3,4,5],[6,7,8],[9,10,11],[12,13,14],[15,16,17],[18,19,20],[21,22,23],[24,25,26],[27,28,29],[30,31,32],[33,34,35],[36,37,38],[39,40,41],[42,43,44],[45,46,47],[48,49,50],[51,52,53],[54,55,56],[57,58,59],[60,61,62],[63,64,65],[66,67,68],[69,70,71],[72,73,74],[75,76,77],[78,79,80],[81,82,83],[84,85,86],[87,88,89],[90,91,92],[93,94,95],[96,97,98],[99,100,101],[102,103,104],[105,106,107],[108,109,110],[111,112,113],[114,115,116],[117,118,119],[120,121,122],[123,124,125],[126,127,128],[129,130,131],[132,133,134],[135,136,137],[138,139,140],[141,142,143],[144,145,146],[147,148,149],[150,151,152],[153,154,155],[156,157,158],[159,160,161],[162,163,164],[165,166,167],[168,169,170],[171,172,173],[174,175,176],[177,178,179],[180,181,182],[183,184,185],[186,187,188],[189,190,191],[192,193,194],[195,196,197],[198,199,200],[201,202,203],[204,205,206],[207,208,209],[210,211,212],[213,214,215],[216,217,218],[219,220,221],[222,223,224],[225,226,227],[228,229,230],[231,232,233],[234,235,236],[237,238,239],[240,241,242],[243,244,245],[246,247,248],[249,250,251],[252,253,254],[255,256,257],[258,259,260],[261,262,263],[264,265,266],[267,268,269],[270,271,272],[273,274,275],[276,277,278],[279,280,281],[282,283,284],[285,286,287],[288,289,290],[291,292,293],[294,295,296],[297,298,299],[300,301,302],[303,304,305],[306,307,308],[309,310,311],[312,313,314],[315,316,317],[318,319,320],[321,322,323],[324,325,326],[327,328,329],[330,331,332],[333,334,335],[336,337,338],[339,340,341],[342,343,344],[345,346,347],[348,349,350],[351,352,353],[354,355,356],[357,358,359],[360,361,362],[363,364,365],[366,367,368],[369,370,371],[372,373,374],[375,376,377],[378,379,380],[381,382,383],[384,385,386],[387,388,389],[390,391,392],[393,394,395],[396,397,398],[399,400,401],[402,403,404],[405,406,407],[408,409,410],[411,412,413],[414,415,416],[417,418,419],[420,421,422],[423,424,425],[426,427,428],[429,430,431],[432,433,434],[435,436,437],[438,439,440],[441,442,443],[444,445,446],[447,448,449],[450,451,452],[453,454,455],[456,457,458],[459,460,461],[462,463,464],[465,466,467],[468,469,470],[471,472,473],[474,475,476],[477,478,479],[480,481,482],[483,484,485],[486,487,488],[489,490,491],[492,493,494],[495,496,497],[498,499,500],[501,502,503],[504,505,506],[507,508,509],[510,511,512],[513,514,515],[516,517,518],[519,520,521],[522,523,524],[525,526,527],[528,529,530],[531,532,533],[534,535,536],[537,538,539],[540,541,542],[543,544,545],[546,547,548],[549,550,551],[552,553,554],[555,556,557],[558,559,560],[561,562,563],[564,565,566],[567,568,569],[570,571,572],[573,574,575],[576,577,578],[579,580,581],[582,583,584],[585,586,587],[588,589,590],[591,592,593],[594,595,596],[597,598,599],[600,601,602],[603,604,605],[606,607,608],[609,610,611],[612,613,614],[615,616,617],[618,619,620],[621,622,623],[624,625,626],[627,628,629],[630,631,632],[633,634,635],[636,637,638],[639,640,641],[642,643,644],[645,646,647],[648,649,650],[651,652,653],[654,655,656],[657,658,659],[660,661,662],[663,664,665],[666,667,668],[669,670,671],[672,673,674],[675,676,677],[678,679,680],[681,682,683],[684,685,686],[687,688,689],[690,691,692],[693,694,695],[696,697,698],[699,700,701],[702,703,704],[705,706,707],[708,709,710],[711,712,713],[714,715,716],[717,718,719],[720,721,722],[723,724,725],[726,727,728],[729,730,731],[732,733,734],[735,736,737],[738,739,740],[741,742,743],[744,745,746],[747,748,749],[750,751,752],[753,754,755],[756,757,758],[759,760,761],[762,763,764],[765,766,767],[768,769,770],[771,772,773],[774,775,776],[777,778,779],[780,781,782],[783,784,785],[786,787,788],[789,790,791],[792,793,794],[795,796,797],[798,799,800],[801,802,803],[804,805,806],[807,808,809],[810,811,812],[813,814,815],[816,817,818],[819,820,821],[822,823,824],[825,826,827],[828,829,830],[831,832,833],[834,835,836],[837,838,839],[840,841,842],[843,844,845],[846,847,848],[849,850,851],[852,853,854],[855,856,857],[858,859,860],[861,862,863],[864,865,866],[867,868,869],[870,871,872],[873,874,875],[876,877,878],[879,880,881],[882,883,884],[885,886,887],[888,889,890],[891,892,893],[894,895,896],[897,898,899]];
  translate([-6,-59,0])
    polyhedron(points=points, faces=faces);
}
fence();
cube(16);
